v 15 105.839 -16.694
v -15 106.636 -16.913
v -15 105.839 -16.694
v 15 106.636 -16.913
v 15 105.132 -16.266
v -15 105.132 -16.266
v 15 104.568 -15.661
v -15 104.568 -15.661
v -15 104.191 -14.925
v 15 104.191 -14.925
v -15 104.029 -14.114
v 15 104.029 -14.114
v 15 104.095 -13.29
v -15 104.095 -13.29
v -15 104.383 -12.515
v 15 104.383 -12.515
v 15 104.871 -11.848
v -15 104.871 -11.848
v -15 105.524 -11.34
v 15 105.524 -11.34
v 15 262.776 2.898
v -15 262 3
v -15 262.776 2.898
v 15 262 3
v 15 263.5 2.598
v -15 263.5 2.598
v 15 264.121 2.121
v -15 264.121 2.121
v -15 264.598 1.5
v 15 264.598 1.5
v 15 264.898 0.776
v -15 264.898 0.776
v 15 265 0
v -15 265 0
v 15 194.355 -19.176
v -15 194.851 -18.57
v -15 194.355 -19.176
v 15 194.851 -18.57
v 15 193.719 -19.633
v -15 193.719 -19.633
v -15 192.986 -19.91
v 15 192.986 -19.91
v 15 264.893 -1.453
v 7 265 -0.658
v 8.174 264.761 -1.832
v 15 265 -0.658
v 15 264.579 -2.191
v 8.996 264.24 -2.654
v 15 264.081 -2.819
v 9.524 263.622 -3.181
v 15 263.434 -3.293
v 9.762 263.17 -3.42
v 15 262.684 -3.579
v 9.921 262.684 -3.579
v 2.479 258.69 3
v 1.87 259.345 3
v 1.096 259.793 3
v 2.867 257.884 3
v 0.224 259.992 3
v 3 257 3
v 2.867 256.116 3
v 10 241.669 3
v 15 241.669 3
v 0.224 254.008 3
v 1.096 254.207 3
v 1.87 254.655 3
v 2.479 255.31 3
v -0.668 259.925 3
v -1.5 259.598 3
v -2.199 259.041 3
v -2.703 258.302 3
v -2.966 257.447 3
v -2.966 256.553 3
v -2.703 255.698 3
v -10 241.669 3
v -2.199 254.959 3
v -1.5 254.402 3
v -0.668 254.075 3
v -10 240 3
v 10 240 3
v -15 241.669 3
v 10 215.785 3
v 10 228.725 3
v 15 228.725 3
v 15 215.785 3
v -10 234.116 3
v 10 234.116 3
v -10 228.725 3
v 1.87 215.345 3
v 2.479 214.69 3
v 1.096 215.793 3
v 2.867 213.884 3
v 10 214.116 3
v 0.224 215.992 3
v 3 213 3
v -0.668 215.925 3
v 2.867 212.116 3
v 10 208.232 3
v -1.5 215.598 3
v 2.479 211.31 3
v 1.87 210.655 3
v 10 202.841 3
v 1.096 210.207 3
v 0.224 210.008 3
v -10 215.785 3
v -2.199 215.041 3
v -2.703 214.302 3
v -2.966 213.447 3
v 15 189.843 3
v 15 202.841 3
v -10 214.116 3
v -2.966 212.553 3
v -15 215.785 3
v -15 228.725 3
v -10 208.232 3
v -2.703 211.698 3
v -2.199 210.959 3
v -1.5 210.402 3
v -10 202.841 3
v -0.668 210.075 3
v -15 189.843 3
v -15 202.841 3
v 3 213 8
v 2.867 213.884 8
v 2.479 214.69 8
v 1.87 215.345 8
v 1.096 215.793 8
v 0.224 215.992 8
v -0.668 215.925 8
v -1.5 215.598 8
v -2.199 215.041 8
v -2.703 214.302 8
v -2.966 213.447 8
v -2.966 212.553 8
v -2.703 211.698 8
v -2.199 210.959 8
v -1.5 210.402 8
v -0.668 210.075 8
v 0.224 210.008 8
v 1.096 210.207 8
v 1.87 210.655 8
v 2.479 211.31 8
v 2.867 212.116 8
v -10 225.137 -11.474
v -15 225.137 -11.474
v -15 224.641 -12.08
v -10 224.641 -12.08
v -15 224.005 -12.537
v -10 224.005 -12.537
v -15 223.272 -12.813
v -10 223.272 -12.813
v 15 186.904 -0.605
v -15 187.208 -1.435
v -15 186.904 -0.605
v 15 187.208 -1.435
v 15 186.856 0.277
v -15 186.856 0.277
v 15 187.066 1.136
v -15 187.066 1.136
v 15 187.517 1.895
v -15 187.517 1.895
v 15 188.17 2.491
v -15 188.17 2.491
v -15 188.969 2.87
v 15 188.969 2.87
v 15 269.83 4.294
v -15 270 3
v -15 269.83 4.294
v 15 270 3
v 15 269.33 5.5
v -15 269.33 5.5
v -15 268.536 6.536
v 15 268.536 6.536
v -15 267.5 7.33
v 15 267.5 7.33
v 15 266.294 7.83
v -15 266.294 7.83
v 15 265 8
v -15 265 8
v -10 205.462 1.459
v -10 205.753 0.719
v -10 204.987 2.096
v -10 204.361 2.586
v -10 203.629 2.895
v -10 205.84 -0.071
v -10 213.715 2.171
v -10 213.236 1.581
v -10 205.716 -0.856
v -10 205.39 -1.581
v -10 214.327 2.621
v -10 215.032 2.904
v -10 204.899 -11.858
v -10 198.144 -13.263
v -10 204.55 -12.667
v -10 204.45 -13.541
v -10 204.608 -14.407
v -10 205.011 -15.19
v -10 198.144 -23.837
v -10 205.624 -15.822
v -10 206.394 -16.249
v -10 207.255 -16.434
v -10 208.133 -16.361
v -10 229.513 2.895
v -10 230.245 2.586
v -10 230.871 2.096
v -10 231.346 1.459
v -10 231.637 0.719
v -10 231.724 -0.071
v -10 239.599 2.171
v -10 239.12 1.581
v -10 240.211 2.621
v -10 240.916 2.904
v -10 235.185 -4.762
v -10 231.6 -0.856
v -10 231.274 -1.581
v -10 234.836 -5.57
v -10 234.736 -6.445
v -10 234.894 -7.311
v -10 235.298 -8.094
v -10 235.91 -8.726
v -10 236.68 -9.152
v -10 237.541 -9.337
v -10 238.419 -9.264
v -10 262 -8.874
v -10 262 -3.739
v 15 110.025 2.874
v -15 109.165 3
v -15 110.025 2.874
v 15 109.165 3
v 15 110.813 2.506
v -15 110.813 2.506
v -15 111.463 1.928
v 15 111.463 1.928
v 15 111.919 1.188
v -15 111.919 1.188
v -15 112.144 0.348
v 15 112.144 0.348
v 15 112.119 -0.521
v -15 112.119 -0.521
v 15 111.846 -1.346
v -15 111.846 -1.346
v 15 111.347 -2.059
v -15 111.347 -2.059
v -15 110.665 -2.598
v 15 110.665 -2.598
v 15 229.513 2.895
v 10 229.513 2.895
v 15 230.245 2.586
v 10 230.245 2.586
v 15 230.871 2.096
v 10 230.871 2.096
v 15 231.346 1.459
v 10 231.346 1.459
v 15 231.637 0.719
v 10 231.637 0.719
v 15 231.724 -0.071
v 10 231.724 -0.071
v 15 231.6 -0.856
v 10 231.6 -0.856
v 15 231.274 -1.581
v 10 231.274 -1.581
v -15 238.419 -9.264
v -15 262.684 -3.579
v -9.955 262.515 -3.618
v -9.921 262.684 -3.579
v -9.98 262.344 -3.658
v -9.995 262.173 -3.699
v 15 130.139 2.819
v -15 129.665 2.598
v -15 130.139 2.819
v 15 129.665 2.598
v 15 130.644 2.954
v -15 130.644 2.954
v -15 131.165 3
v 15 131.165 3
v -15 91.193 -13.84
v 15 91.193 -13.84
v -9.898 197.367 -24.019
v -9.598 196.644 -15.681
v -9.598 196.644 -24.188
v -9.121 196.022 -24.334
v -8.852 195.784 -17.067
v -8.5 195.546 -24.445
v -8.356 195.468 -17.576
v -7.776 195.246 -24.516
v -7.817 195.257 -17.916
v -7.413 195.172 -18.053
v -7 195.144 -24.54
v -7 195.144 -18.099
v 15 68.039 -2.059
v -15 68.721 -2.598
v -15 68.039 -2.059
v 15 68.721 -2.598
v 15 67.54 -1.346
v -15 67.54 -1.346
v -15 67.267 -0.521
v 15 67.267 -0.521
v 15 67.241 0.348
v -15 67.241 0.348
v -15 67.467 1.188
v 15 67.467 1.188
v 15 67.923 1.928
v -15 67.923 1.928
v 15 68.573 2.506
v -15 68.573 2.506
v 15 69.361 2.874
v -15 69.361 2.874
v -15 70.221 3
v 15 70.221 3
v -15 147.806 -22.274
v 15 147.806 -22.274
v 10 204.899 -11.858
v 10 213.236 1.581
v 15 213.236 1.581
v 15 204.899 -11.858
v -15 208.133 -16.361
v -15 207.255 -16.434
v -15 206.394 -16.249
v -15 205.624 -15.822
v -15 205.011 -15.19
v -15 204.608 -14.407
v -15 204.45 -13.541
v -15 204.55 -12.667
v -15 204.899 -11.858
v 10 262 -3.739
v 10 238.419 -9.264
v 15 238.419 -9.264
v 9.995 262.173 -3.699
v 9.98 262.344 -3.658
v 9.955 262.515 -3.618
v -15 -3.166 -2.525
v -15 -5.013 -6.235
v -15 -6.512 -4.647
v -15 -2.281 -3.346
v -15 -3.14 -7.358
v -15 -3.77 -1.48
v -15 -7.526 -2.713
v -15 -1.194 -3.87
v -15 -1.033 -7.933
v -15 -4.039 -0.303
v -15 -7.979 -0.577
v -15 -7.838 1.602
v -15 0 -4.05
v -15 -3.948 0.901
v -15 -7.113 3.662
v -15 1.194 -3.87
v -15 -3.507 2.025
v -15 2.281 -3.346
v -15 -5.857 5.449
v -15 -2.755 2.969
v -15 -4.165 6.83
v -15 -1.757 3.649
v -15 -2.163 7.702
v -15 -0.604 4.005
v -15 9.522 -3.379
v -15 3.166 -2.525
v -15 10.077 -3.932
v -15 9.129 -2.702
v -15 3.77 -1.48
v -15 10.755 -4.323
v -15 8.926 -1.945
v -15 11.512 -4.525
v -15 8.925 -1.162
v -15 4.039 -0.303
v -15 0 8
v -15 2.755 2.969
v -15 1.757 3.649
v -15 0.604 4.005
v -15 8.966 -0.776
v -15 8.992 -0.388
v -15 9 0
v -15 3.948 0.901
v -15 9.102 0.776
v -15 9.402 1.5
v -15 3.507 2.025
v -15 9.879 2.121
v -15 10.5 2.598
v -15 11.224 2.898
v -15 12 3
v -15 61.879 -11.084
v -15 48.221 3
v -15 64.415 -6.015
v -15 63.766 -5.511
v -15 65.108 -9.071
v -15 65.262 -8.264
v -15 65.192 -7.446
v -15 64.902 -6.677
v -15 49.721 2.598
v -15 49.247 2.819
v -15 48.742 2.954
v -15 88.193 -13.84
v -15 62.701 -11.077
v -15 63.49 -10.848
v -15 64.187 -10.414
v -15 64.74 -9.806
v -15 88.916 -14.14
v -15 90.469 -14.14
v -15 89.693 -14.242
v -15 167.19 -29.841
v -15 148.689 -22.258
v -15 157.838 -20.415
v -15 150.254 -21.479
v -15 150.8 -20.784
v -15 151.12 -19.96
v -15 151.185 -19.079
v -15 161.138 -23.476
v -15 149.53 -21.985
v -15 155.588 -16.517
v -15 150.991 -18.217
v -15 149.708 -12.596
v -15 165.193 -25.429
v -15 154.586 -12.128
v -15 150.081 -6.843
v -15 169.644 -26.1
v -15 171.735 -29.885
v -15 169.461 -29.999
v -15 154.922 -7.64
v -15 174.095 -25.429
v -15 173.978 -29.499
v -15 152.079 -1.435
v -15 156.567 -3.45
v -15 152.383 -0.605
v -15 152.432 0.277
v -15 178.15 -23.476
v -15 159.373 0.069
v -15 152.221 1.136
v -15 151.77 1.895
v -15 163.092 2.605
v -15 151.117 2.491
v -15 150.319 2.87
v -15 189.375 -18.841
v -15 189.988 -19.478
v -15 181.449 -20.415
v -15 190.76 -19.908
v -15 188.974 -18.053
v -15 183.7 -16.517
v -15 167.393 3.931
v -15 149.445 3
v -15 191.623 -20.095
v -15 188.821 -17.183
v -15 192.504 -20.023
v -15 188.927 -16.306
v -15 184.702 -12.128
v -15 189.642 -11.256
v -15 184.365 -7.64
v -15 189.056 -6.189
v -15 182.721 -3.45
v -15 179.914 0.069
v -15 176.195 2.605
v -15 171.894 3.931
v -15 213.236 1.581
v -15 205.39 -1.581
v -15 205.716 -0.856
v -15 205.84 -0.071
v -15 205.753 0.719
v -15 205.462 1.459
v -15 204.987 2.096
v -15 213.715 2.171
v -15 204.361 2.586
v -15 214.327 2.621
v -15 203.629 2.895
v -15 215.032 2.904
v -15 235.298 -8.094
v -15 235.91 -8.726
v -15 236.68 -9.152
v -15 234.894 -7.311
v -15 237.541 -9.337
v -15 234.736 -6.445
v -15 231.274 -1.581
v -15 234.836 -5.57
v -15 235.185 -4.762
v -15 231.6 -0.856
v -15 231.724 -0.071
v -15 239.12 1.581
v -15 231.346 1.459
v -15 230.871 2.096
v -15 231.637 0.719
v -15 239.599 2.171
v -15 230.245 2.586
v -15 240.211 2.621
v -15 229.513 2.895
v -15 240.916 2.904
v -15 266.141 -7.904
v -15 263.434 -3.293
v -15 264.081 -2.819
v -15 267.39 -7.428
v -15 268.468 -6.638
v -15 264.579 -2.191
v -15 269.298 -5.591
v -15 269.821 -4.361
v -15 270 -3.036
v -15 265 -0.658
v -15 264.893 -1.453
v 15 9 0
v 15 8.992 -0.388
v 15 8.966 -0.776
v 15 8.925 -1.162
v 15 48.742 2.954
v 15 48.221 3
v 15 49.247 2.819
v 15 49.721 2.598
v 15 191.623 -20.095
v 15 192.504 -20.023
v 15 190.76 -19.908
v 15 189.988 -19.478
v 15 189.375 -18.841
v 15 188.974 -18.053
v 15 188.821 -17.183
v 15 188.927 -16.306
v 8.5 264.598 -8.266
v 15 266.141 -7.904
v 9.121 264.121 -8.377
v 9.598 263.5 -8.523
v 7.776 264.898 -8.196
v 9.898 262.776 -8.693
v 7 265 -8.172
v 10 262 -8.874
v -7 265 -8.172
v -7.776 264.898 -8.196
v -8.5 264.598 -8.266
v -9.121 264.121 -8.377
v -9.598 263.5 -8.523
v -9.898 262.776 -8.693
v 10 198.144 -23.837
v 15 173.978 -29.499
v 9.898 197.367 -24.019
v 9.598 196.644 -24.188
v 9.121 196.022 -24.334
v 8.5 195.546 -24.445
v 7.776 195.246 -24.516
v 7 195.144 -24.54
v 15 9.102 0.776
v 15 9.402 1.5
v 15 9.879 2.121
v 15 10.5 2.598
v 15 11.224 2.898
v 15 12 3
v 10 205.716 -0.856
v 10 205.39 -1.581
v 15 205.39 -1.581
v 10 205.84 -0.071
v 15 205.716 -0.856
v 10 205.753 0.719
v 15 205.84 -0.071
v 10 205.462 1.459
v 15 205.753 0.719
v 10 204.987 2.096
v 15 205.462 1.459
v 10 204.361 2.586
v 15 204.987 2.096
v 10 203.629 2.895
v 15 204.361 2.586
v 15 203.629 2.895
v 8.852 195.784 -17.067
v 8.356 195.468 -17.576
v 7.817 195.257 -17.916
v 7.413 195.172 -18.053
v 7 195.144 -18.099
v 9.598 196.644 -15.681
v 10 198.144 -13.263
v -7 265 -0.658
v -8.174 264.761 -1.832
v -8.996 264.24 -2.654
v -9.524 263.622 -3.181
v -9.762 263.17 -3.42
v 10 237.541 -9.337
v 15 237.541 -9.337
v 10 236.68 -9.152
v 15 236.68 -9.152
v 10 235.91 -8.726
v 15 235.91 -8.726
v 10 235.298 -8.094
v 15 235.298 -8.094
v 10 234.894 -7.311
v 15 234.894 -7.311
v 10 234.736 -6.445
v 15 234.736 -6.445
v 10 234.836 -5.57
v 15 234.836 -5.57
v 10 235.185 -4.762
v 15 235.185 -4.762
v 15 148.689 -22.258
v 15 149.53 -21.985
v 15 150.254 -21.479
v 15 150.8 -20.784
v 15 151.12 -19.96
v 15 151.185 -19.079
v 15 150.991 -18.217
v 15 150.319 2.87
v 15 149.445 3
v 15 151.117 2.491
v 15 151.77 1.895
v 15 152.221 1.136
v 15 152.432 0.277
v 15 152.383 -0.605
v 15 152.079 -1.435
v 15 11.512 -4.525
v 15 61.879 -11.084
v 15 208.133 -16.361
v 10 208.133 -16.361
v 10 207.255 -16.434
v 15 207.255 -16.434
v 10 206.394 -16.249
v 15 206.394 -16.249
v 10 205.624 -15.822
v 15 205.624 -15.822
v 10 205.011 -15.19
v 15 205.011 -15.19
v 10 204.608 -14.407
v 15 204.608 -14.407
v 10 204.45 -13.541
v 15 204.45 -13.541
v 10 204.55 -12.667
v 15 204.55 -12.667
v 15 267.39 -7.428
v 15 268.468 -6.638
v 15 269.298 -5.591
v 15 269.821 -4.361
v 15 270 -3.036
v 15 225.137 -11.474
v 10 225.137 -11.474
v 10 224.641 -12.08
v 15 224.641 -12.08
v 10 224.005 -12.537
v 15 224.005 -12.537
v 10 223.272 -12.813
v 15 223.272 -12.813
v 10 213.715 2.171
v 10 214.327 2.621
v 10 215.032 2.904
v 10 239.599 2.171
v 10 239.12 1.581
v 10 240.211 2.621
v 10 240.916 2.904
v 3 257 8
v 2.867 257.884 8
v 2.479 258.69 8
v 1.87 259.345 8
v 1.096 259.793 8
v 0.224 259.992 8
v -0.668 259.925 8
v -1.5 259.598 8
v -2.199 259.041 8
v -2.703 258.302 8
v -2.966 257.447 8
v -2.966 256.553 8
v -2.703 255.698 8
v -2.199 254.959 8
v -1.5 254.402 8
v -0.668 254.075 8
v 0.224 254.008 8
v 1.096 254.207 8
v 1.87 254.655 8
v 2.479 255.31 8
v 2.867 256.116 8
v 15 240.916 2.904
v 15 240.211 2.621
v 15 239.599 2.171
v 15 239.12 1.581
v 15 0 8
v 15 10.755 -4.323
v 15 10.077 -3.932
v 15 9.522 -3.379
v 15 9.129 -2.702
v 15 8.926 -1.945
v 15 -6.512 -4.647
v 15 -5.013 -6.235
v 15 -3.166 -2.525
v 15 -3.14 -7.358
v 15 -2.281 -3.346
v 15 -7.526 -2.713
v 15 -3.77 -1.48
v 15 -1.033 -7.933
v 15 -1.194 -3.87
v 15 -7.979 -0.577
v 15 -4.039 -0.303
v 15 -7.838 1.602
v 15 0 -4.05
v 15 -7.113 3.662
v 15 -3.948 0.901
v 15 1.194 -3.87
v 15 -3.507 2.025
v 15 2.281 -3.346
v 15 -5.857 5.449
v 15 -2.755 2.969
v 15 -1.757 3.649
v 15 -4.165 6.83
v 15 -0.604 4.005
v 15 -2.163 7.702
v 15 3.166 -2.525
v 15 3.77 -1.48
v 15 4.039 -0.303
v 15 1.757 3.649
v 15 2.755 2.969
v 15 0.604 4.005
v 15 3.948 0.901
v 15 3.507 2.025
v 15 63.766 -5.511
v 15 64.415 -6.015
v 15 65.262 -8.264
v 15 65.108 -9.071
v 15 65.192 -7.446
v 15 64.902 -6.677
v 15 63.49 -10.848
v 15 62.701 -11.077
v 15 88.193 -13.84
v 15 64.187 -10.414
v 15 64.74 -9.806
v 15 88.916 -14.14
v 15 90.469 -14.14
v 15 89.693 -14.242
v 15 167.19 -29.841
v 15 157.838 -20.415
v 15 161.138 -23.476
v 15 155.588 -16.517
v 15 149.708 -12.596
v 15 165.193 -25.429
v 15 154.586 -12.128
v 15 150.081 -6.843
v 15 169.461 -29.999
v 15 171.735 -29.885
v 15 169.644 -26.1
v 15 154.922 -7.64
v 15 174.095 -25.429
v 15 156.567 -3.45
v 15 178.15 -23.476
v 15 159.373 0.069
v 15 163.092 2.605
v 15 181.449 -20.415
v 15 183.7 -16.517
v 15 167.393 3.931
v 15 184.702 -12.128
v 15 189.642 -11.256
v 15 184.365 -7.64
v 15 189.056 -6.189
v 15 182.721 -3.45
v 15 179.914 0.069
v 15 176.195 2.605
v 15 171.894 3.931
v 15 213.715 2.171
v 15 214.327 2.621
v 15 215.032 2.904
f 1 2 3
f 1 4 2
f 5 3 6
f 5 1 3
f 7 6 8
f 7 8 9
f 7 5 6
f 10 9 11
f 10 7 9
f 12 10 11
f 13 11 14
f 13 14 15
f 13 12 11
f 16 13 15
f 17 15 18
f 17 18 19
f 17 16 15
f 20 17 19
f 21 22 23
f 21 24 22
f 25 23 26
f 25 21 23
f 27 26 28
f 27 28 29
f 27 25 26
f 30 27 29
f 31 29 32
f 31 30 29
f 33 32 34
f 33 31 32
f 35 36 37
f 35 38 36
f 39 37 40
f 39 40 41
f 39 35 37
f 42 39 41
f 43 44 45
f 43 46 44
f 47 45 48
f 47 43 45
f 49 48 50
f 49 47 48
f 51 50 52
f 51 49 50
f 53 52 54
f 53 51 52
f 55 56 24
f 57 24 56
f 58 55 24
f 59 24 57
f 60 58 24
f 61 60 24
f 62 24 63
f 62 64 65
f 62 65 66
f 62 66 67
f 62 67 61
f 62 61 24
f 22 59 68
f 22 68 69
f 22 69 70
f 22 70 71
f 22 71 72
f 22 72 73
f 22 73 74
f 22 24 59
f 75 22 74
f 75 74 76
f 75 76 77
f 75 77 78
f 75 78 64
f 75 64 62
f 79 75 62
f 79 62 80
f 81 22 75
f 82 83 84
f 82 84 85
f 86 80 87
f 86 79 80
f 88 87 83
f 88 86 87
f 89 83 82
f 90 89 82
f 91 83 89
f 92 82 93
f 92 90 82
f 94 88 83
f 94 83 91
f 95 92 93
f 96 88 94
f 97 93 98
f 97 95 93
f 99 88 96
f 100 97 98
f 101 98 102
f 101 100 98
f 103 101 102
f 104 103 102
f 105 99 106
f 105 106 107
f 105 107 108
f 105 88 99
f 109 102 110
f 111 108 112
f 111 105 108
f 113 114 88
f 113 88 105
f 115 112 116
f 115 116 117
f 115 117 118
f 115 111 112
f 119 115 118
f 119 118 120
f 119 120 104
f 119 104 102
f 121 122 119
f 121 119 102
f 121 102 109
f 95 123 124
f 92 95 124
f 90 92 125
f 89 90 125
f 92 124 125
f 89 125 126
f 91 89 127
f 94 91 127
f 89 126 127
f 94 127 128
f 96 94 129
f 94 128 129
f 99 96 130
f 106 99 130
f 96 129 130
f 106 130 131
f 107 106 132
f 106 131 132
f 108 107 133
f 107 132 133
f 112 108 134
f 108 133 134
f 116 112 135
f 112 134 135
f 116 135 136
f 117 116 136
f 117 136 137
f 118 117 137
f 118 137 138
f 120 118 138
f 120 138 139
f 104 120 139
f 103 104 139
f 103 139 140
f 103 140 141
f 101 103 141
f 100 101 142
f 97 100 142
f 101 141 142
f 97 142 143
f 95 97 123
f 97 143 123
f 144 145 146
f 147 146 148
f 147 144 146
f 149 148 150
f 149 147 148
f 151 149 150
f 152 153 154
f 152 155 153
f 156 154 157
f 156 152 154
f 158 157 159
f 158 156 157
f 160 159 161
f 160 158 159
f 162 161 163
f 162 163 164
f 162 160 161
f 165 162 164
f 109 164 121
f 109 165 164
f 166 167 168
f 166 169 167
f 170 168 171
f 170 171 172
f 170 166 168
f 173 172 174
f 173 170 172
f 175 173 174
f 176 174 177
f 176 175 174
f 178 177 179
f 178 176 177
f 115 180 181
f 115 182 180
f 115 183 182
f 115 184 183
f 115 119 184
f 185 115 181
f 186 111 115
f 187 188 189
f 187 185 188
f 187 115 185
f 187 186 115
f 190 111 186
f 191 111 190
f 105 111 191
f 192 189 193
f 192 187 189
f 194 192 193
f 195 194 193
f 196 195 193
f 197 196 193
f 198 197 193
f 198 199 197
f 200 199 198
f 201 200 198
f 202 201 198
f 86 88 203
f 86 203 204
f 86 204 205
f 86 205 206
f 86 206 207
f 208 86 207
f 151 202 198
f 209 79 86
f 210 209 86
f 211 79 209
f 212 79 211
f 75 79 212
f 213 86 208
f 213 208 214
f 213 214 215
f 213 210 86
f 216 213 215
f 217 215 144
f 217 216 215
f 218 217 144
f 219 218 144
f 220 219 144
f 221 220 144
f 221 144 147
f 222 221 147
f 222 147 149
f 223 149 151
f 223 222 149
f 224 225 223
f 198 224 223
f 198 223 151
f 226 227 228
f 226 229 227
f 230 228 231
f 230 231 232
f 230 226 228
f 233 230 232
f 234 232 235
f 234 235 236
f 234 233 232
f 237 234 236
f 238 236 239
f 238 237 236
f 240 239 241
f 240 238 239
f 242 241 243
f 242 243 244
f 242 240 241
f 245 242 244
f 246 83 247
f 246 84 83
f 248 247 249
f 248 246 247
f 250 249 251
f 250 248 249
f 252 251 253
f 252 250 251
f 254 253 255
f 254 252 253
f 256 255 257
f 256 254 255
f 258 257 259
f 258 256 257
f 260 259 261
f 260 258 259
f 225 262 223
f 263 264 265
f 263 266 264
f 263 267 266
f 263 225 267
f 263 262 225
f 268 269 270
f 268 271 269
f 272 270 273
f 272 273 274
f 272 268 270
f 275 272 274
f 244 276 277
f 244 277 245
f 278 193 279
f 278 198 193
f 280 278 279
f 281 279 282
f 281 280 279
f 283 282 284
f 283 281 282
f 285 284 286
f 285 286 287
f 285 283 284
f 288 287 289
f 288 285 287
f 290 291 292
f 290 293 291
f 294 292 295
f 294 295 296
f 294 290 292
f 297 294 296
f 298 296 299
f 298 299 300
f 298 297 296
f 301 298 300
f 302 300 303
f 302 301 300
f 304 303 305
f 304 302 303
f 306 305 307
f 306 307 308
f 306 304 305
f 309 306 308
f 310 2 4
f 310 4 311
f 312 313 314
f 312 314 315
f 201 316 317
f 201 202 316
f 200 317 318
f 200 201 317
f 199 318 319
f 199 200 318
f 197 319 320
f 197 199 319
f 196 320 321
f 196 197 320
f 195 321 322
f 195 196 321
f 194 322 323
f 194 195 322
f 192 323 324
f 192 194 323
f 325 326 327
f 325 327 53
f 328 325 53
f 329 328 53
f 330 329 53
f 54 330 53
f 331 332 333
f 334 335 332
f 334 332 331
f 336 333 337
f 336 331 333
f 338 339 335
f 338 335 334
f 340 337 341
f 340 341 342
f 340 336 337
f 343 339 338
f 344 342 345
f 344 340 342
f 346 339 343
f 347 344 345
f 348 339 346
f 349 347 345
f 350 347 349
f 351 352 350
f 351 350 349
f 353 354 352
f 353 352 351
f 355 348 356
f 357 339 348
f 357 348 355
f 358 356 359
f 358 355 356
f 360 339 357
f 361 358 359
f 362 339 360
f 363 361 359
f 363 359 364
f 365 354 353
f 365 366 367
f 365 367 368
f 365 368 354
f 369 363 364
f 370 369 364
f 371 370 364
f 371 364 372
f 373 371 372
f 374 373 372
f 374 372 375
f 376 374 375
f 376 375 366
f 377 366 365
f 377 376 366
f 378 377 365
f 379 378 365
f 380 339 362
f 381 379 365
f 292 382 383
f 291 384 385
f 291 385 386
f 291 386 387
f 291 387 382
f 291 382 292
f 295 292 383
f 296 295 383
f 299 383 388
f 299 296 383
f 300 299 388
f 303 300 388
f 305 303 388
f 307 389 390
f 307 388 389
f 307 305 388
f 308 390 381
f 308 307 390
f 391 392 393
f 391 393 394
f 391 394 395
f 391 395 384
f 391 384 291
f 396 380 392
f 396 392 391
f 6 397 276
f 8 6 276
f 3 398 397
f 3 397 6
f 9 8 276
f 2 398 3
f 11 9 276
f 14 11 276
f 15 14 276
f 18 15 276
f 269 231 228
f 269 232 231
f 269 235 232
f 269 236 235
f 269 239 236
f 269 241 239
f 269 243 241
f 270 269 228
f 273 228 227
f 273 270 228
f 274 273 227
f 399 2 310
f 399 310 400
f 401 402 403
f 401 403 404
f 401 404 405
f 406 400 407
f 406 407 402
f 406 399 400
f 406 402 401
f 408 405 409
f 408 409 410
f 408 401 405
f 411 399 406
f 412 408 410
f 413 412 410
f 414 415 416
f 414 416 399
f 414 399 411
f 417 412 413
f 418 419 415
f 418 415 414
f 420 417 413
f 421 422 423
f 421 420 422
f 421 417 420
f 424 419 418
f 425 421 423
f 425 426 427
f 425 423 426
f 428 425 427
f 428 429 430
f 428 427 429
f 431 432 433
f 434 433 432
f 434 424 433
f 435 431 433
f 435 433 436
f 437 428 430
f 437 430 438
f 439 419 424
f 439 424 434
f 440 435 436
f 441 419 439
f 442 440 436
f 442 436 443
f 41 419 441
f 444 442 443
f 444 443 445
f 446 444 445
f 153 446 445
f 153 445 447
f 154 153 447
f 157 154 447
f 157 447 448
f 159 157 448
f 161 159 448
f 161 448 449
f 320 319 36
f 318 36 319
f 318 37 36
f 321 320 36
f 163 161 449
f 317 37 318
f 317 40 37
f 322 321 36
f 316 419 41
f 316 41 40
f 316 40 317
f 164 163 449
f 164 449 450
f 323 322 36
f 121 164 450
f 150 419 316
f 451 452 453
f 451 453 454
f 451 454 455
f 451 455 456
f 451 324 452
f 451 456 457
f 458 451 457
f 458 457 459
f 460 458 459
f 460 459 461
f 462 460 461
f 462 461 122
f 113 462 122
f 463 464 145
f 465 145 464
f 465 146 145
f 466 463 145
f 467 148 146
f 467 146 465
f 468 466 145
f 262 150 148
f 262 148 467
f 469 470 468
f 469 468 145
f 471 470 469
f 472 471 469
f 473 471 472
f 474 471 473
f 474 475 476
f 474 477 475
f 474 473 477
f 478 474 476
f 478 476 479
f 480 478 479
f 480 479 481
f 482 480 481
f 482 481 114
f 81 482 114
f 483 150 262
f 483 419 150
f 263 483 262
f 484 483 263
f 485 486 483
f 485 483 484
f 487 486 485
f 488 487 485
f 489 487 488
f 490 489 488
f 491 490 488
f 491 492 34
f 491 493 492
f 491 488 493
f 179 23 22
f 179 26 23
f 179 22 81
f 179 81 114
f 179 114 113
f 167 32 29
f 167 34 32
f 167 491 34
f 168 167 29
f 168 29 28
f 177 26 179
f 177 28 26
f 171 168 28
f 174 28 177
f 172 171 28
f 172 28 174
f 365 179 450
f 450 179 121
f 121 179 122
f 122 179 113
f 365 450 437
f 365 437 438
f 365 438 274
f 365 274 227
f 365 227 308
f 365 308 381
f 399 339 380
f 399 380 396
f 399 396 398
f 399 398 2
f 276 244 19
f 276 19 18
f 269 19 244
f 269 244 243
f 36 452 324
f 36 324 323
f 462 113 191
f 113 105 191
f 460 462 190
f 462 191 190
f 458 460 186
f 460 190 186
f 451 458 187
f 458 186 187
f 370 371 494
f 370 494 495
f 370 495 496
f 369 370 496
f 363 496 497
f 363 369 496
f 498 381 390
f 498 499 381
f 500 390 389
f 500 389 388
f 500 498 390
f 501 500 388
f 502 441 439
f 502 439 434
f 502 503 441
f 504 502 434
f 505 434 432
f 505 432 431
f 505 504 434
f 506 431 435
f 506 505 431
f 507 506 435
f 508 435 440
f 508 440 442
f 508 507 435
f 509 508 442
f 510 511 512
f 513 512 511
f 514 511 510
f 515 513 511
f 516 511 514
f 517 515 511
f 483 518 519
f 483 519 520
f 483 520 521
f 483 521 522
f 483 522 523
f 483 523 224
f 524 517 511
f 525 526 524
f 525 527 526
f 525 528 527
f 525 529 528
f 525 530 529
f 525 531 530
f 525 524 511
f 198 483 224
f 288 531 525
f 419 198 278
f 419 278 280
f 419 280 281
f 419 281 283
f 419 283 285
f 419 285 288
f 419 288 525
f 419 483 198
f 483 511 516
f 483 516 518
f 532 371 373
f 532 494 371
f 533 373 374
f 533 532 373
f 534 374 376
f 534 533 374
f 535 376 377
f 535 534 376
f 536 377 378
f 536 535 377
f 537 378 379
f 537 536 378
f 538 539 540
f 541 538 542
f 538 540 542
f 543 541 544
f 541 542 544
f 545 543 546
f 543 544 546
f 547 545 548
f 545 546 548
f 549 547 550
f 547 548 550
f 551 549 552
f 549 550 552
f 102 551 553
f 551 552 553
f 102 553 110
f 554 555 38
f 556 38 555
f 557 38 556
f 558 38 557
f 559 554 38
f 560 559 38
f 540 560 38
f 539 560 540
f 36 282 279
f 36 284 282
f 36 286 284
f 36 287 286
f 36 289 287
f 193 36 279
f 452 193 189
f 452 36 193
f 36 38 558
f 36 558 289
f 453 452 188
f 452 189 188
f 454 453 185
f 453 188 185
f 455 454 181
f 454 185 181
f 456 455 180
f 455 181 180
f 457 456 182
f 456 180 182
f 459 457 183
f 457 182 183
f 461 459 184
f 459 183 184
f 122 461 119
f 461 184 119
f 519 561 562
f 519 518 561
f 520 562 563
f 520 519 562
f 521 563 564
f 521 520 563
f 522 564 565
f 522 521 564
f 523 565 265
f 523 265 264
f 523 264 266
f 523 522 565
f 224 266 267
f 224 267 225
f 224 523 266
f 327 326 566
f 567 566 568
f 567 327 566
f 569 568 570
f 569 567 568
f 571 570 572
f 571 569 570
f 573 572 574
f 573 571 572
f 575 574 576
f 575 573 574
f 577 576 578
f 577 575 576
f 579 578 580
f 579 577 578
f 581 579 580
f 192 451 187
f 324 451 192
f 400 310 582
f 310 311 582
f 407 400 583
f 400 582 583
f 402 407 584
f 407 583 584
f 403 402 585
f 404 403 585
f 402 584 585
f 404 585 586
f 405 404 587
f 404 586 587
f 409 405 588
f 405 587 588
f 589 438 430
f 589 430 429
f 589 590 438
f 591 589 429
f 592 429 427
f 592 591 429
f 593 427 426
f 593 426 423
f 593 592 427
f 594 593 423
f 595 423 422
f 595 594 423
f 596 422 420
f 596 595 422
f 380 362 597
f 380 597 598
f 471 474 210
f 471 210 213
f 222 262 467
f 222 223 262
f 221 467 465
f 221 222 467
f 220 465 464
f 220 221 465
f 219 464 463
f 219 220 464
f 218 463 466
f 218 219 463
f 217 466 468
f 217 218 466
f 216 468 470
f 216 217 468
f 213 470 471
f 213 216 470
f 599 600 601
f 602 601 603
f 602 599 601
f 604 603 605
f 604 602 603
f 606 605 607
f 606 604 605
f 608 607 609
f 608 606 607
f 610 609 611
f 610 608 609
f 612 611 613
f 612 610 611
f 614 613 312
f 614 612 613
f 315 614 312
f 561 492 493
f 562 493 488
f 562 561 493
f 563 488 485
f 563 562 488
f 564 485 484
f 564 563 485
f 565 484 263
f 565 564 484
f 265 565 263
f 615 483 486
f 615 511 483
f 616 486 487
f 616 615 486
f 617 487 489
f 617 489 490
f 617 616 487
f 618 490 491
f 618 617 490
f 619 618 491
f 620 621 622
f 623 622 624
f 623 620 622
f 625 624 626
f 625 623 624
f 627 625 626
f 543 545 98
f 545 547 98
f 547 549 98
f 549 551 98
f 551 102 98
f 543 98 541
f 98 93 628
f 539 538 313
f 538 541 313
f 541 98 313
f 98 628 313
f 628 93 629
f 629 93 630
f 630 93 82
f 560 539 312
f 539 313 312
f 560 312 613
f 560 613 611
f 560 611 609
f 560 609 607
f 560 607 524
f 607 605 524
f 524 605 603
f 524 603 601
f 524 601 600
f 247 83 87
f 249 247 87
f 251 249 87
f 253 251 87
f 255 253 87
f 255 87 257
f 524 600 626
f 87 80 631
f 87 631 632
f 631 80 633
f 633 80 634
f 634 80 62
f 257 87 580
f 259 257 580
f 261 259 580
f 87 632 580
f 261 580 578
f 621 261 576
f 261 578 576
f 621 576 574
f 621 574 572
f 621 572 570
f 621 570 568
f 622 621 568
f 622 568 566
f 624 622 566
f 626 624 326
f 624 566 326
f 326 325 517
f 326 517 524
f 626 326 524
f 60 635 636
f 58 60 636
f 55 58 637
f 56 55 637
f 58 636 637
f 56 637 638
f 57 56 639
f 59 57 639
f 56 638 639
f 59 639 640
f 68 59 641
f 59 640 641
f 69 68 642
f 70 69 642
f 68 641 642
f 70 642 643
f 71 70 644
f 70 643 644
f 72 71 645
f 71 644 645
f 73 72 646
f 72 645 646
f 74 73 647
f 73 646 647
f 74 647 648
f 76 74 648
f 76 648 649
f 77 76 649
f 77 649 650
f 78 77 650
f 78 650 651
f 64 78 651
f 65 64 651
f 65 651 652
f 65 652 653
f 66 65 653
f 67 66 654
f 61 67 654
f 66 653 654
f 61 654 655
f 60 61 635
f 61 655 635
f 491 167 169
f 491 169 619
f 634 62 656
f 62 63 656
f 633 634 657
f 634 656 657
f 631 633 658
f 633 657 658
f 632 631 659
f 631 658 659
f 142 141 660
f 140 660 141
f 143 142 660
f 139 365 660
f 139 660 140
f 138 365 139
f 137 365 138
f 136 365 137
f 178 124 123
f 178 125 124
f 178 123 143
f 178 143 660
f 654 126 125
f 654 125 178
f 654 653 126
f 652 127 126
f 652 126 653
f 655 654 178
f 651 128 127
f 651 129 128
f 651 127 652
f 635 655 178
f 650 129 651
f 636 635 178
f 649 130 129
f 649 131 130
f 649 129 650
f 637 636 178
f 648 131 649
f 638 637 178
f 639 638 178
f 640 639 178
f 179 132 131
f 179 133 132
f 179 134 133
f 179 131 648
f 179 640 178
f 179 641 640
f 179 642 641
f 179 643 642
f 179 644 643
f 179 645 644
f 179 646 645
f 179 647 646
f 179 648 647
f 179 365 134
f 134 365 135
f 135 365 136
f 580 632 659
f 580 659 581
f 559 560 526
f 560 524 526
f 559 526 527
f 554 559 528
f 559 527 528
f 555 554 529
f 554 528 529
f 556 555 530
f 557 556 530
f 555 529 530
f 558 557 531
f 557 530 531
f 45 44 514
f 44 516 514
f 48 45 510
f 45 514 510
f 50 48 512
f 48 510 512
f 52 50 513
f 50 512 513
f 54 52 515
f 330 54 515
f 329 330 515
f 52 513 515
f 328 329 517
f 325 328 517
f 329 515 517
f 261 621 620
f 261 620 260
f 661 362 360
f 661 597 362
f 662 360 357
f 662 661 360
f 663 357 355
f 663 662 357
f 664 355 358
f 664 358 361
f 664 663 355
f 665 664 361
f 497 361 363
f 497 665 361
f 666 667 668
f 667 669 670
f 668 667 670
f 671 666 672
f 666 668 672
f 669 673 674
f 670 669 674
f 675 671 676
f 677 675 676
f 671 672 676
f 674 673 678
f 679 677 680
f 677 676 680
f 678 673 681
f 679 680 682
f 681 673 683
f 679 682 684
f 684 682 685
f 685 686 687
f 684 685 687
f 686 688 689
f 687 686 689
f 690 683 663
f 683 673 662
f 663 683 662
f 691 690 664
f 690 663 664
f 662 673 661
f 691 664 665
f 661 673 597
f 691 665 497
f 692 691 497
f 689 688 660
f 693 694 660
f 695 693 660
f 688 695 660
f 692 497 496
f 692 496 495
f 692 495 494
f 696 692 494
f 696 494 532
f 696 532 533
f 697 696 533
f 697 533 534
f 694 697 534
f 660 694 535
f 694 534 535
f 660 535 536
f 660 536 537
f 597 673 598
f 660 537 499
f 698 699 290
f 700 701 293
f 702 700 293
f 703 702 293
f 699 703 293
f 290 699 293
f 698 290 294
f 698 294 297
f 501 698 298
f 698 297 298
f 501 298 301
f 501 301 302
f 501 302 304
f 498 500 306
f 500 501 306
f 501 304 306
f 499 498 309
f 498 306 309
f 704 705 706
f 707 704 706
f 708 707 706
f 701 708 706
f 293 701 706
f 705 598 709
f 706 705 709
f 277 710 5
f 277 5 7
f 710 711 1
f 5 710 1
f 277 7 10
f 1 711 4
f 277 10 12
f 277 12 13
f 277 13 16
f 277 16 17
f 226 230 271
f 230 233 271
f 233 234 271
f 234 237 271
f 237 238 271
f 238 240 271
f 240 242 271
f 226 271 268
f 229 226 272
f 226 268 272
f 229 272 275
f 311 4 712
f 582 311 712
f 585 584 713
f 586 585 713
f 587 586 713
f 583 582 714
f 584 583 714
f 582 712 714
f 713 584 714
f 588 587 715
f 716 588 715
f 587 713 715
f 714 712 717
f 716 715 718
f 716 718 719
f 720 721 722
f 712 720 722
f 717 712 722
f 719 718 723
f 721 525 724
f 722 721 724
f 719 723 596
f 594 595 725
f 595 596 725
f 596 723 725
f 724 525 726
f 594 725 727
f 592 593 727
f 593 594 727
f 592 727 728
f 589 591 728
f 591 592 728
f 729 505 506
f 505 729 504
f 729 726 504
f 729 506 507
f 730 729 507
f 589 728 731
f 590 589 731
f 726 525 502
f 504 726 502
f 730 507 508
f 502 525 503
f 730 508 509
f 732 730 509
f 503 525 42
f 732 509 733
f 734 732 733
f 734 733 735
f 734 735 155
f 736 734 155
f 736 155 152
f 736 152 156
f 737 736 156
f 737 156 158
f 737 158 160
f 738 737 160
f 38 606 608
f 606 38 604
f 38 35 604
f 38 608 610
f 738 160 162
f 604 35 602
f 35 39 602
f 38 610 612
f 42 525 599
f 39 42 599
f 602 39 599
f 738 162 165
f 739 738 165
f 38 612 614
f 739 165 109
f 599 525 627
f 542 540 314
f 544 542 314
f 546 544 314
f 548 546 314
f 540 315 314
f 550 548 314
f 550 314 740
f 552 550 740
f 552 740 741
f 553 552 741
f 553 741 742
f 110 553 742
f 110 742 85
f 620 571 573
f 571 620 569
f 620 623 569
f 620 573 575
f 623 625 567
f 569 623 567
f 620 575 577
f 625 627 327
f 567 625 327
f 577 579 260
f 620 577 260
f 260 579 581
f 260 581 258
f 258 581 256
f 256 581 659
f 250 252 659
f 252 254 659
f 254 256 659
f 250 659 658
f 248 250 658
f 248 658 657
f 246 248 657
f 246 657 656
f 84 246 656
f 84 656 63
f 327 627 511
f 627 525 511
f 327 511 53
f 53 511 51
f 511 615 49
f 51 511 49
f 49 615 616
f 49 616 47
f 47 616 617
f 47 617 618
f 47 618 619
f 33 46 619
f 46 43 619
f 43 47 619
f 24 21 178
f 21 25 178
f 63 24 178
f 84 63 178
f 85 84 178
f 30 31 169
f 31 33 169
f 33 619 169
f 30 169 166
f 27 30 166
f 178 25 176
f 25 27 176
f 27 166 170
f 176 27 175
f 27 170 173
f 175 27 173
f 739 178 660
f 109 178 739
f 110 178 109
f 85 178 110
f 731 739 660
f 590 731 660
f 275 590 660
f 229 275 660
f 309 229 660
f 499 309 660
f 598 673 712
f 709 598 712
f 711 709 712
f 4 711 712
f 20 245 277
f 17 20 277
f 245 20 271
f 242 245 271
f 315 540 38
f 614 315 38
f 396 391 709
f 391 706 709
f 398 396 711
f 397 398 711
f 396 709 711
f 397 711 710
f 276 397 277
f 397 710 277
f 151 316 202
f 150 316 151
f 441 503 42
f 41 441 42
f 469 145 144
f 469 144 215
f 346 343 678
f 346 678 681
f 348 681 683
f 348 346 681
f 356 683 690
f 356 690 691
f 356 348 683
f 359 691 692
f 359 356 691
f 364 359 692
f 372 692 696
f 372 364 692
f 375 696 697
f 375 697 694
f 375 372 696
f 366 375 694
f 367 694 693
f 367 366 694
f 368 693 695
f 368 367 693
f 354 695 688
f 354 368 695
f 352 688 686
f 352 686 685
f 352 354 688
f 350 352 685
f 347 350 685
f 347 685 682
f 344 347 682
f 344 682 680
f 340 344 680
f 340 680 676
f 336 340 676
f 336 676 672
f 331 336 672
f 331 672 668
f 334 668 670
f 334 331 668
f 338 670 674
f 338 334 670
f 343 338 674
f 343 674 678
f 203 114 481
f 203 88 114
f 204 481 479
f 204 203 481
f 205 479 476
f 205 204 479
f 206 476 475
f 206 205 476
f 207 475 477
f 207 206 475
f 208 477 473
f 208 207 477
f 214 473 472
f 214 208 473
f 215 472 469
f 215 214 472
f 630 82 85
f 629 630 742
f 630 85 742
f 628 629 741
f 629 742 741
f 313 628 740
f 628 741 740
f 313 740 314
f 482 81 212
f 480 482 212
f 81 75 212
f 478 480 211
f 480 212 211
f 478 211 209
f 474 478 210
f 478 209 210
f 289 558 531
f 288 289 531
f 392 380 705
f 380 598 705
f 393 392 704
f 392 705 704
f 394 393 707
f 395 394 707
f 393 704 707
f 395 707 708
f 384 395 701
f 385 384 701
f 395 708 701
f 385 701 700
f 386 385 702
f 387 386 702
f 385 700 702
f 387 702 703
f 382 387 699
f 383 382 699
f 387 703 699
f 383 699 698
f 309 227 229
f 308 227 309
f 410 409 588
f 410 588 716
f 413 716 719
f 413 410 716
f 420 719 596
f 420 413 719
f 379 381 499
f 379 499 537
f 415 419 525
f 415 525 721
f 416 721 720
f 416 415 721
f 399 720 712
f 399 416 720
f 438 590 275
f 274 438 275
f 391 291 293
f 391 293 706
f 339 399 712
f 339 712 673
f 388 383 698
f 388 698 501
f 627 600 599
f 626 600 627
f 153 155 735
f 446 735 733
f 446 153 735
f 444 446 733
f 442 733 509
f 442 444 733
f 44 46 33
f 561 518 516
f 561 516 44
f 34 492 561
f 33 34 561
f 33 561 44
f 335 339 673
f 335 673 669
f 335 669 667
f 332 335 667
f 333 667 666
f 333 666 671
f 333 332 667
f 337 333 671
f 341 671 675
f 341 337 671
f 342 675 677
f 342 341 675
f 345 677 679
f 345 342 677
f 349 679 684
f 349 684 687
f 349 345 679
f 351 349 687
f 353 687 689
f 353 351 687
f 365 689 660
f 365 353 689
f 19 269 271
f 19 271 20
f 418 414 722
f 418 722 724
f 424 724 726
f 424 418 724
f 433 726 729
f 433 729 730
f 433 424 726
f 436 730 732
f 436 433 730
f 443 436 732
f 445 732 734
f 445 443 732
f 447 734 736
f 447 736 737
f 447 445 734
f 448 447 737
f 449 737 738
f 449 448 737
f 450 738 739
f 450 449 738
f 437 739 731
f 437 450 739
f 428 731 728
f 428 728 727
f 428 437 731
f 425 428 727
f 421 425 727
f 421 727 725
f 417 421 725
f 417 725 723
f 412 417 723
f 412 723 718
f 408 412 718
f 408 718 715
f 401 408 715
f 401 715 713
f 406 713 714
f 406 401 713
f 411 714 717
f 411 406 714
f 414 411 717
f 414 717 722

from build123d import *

# Parameters (mm, degrees)
BOSS_EXTRUDE1_DEPTH      = 15
BOSS_EXTRUDE1_DEPTH_BACK = 15
SKETCH1_R                = 4.05
SKETCH1_R_2              = 15.1
CUT_EXTRUDE2_DEPTH       = 10
CUT_EXTRUDE2_DEPTH_BACK  = 10
SKETCH5_W                = 66.834238055
SKETCH5_H                = 69.856255641
CUT_EXTRUDE1_DEPTH       = 274.313007374
CUT_EXTRUDE1_DEPTH_BACK  = 274.313007374
FILLET1_R                = 3
FILLET2_R                = 5
SKETCH6_R                = 3
CUT_EXTRUDE3_DEPTH       = 5


with BuildPart() as part:
    # Sketch1 → Boss-Extrude1 (new, two sides: drawn at the far end of the back side and taken through both)
    with BuildSketch(Plane(origin=(0, 0, 0), x_dir=(0, 0, -1), z_dir=(1, 0, 0)).offset(-BOSS_EXTRUDE1_DEPTH_BACK)):
        with BuildLine():
            Line((-8, 0), (-8, 270))
            Line((-8, 270), (7, 270))
            Line((7, 270), (29.498971947, 173.978261275))
            ThreePointArc((29.498971947, 173.978261275), (29.975942027, 170.599581269), (29.840899654, 167.190073592))
            Line((29.840899654, 167.190073592), (7.933010381, -1.033124533))
            ThreePointArc((7.933010381, -1.033124533), (-0.517647059, -7.983235029), (-8, 0))
        make_face()
        Circle(SKETCH1_R, mode=Mode.SUBTRACT)
        with Locations((11, 169.643744359)):
            Circle(SKETCH1_R_2, mode=Mode.SUBTRACT)
    extrude(amount=BOSS_EXTRUDE1_DEPTH + BOSS_EXTRUDE1_DEPTH_BACK)

    # Sketch5 → Cut-Extrude2 (cut, two sides: drawn at the far end of the back side and taken through both)
    with BuildSketch(Plane(origin=(0, 0, 0), x_dir=(0, 0, -1), z_dir=(1, 0, 0)).offset(-CUT_EXTRUDE2_DEPTH_BACK)):
        with Locations((30.417119028, 230.07187218)):
            Rectangle(SKETCH5_W, SKETCH5_H)
    extrude(amount=CUT_EXTRUDE2_DEPTH + CUT_EXTRUDE2_DEPTH_BACK, mode=Mode.SUBTRACT)

    # Sketch4 → Cut-Extrude1 (cut, two sides: drawn at the far end of the back side and taken through both)
    with BuildSketch(Plane(origin=(15, 0, 0), x_dir=(0, 0, -1), z_dir=(1, 0, 0)).offset(-CUT_EXTRUDE1_DEPTH_BACK)):
        with BuildLine():
            ThreePointArc((23.038271938, 153.672519962), (9.705882353, 149.685656787), (-3, 155.360887501))
            Line((-3, 155.360887501), (-3, 130.360887501))
            Line((-3, 130.360887501), (15.768762187, 97.852437799))
            Line((15.768762187, 97.852437799), (23.038271938, 153.672519962))
        make_face()
        with BuildLine():
            Line((-3, 208.232171682), (-3, 183.926601216))
            ThreePointArc((-3, 183.926601216), (8.703485357, 189.511457375), (21.372438031, 186.743818314))
            Line((21.372438031, 186.743818314), (19.626242772, 194.196279044))
            Line((19.626242772, 194.196279044), (-3, 208.232171682))
        make_face()
        Polygon((14.706143018, 89.692948188), (-3, 120.360887501), (-3, 59.025008875), align=None)
        Polygon((-3, 234.116085841), (-3, 214.116085841), (18.013102612, 201.080883522), (12.529881351, 224.48232784), align=None)
        with BuildLine():
            Line((13.024511965, 76.780277764), (-3, 49.025008875))
            Line((-3, 49.025008875), (-3, 8.485281374))
            ThreePointArc((-3, 8.485281374), (0.582352941, 8.981139407), (4.070672938, 8.026806453))
            Line((4.070672938, 8.026806453), (13.024511965, 76.780277764))
        make_face()
        Polygon((-3, 265), (-3, 240), (10.916741191, 231.366932319), (3.03613565, 265), align=None)
    extrude(amount=CUT_EXTRUDE1_DEPTH + CUT_EXTRUDE1_DEPTH_BACK, mode=Mode.SUBTRACT)

    # Fillet1
    fillet1_edges = [part.edges().sort_by_distance(p)[0] for p in [
        (0, 89.692948188, -14.706143018),
        (0, 59.025008875, 3),
        (0, 120.360887501, 3),
        (12.5, 240, 3),
        (12.5, 265, -3.03613565),
        (12.5, 231.366932319, -10.916741191),
        (-12.5, 240, 3),
        (-12.5, 265, -3.03613565),
        (-12.5, 231.366932319, -10.916741191),
        (0, 183.926601216, 3),
        (12.5, 208.232171682, 3),
        (-12.5, 208.232171682, 3),
        (0, 186.743818314, -21.372438031),
        (0, 194.196279044, -19.626242772),
        (0, 8.026806453, -4.070672938),
        (0, 8.485281374, 3),
        (0, 49.025008875, 3),
        (0, 76.780277764, -13.024511965),
        (12.5, 214.116085841, 3),
        (12.5, 234.116085841, 3),
        (12.5, 224.48232784, -12.529881351),
        (12.5, 201.080883522, -18.013102612),
        (-12.5, 214.116085841, 3),
        (-12.5, 234.116085841, 3),
        (-12.5, 224.48232784, -12.529881351),
        (-12.5, 201.080883522, -18.013102612),
        (0, 155.360887501, 3),
        (0, 153.672519962, -23.038271938),
        (0, 97.852437799, -15.768762187),
        (0, 130.360887501, 3),
        (0, 265, 3),
        (-10, 265, -5.603845906),
        (10, 265, -5.603845906),
        (-10, 195.143744359, -21.319282147),
        (10, 195.143744359, -21.319282147),
    ]]
    fillet(fillet1_edges, radius=FILLET1_R)

    # Fillet2
    fillet2_edges = [part.edges().sort_by_distance(p)[0] for p in [
        (0, 270, 8),
        (0, 270, -7),
    ]]
    fillet(fillet2_edges, radius=FILLET2_R)

    # Sketch6 → Cut-Extrude3 (cut)
    with BuildSketch(Plane.XY.offset(8)):
        with Locations((0, 257)):
            Circle(SKETCH6_R)
        with Locations((0, 213)):
            Circle(SKETCH6_R)
    extrude(amount=-CUT_EXTRUDE3_DEPTH, mode=Mode.SUBTRACT)


solid = part.part
